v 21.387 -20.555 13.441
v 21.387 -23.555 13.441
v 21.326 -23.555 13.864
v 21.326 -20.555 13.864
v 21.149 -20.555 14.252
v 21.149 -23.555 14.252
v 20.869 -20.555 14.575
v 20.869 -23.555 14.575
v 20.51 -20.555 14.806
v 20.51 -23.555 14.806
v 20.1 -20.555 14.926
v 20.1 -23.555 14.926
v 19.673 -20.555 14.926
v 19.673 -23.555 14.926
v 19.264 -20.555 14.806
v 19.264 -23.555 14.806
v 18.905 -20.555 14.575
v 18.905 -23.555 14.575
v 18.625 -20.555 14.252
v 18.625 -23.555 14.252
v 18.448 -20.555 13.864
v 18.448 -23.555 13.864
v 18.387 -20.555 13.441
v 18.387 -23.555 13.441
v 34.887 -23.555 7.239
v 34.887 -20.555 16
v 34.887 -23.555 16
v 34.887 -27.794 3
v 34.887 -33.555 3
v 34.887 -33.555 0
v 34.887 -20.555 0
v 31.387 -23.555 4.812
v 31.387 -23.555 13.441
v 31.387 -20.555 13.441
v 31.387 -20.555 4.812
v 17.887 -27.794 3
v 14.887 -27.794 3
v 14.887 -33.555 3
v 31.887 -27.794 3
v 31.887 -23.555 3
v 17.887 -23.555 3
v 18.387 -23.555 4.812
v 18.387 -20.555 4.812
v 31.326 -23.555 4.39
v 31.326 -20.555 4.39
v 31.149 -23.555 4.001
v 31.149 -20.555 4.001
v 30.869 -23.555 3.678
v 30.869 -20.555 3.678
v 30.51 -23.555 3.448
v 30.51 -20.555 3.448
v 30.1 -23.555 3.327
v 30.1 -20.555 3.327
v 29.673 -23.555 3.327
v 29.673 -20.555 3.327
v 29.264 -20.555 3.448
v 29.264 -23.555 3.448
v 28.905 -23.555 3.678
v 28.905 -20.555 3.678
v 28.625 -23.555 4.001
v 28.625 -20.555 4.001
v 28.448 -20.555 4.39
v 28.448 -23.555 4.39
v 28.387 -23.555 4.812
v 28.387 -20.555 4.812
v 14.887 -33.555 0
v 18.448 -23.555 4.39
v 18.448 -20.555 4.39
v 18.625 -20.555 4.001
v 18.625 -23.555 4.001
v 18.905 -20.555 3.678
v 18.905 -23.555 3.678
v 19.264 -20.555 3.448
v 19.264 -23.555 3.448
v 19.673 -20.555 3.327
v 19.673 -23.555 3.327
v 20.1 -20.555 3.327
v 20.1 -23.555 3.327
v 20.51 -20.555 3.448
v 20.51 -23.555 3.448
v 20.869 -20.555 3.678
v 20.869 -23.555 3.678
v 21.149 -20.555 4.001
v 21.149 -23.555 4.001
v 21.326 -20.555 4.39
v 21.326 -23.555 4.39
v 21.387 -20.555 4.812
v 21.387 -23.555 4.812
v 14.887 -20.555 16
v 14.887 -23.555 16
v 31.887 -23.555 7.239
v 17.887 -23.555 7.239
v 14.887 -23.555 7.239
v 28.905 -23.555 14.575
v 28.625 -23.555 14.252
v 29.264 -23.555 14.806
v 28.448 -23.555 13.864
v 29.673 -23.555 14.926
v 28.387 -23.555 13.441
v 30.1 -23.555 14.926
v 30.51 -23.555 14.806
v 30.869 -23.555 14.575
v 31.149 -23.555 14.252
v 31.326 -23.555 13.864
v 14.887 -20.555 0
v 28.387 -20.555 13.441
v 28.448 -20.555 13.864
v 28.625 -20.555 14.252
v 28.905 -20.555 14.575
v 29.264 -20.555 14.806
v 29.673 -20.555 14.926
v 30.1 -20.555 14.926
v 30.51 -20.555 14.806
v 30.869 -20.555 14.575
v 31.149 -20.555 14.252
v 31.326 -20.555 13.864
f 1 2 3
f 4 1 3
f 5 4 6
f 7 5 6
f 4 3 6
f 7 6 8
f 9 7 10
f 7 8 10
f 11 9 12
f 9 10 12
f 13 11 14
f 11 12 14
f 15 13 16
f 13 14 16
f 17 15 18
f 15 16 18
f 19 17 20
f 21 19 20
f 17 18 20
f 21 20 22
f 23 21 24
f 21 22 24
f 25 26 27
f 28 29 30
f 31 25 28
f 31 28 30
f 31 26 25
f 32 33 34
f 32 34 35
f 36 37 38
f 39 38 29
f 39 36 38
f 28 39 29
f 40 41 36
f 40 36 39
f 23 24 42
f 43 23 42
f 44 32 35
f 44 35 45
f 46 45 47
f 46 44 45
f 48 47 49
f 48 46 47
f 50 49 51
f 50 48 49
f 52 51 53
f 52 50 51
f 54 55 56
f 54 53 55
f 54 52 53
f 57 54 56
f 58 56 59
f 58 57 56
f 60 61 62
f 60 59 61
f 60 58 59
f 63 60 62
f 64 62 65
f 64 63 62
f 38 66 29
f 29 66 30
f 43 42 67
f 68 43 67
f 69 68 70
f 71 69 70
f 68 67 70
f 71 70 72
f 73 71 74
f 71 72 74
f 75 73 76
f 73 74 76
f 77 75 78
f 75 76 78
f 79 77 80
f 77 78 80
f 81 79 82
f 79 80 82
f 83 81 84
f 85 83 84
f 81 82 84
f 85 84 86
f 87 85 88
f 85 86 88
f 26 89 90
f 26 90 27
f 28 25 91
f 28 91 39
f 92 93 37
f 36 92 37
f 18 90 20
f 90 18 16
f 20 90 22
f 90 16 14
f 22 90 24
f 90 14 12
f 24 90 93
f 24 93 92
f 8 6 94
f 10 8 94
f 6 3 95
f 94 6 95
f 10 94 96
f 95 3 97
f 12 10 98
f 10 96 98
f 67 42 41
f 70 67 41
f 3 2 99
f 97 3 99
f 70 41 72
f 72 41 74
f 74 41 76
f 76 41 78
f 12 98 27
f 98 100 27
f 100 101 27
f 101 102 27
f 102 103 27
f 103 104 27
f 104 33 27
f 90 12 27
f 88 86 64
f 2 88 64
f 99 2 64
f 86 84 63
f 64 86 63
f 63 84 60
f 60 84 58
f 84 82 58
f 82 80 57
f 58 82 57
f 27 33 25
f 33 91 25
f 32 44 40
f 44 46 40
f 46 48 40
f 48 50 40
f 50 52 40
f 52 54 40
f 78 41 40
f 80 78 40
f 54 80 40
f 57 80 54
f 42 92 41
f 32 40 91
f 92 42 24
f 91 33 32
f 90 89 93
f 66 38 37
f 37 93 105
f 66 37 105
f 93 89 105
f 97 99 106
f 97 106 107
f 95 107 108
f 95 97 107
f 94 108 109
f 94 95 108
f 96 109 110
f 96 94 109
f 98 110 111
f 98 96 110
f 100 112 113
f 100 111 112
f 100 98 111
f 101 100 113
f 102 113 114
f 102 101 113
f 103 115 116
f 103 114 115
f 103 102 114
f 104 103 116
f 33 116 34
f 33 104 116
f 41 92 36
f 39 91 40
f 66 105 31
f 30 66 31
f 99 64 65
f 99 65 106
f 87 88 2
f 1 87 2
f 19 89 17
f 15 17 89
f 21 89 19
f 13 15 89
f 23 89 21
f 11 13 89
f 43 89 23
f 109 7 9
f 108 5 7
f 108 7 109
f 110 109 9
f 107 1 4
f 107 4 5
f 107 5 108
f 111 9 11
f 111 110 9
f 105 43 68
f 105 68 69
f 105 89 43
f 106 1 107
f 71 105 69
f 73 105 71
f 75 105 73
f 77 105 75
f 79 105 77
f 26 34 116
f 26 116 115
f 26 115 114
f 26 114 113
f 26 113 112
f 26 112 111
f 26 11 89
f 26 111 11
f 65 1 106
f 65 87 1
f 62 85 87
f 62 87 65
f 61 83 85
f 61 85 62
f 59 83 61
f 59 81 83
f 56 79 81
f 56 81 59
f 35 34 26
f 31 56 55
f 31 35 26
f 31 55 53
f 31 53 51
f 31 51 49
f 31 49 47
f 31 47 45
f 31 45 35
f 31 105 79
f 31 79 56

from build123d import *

# Parameters (mm, degrees)
SKETCH1_W           = 20
SKETCH1_H           = 13
BOSS_EXTRUDE1_DEPTH = 3
SKETCH2_W           = 20
SKETCH2_H           = 3
BOSS_EXTRUDE2_DEPTH = 13
BOSS_EXTRUDE3_DEPTH = 3
CUT_EXTRUDE1_DEPTH  = 40.66221139


with BuildPart() as part:
    # Sketch1 → Boss-Extrude1 (new body)
    with BuildSketch(Plane.XY):
        with Locations((24.886831503, -27.055)):
            Rectangle(SKETCH1_W, SKETCH1_H)
    extrude(amount=BOSS_EXTRUDE1_DEPTH)

    # Sketch2 → Boss-Extrude2 (add)
    with BuildSketch(Plane.XY.offset(3)):
        with Locations((24.886831503, -22.055)):
            Rectangle(SKETCH2_W, SKETCH2_H)
    extrude(amount=BOSS_EXTRUDE2_DEPTH)

    # Sketch3 → Boss-Extrude3 (add)
    with BuildSketch(Plane(origin=(34.886831503, 0, 0), x_dir=(0, 0, -1), z_dir=(1, 0, 0))):
        Polygon((-7.239132511, -23.555), (-3, -27.79413251), (-3, -23.554999999), align=None)
    boss_extrude3 = extrude(amount=-BOSS_EXTRUDE3_DEPTH)

    # Sketch4 → Cut-Extrude1 (cut, through all)
    with BuildSketch(Plane.XZ.offset(23.555)):
        with BuildLine():
            Line((28.386831503, 4.812110779), (28.386831503, 13.441160462))
            ThreePointArc((28.386831503, 13.441160462), (29.886831503, 14.941160462), (31.386831503, 13.441160462))
            Line((31.386831503, 13.441160462), (31.386831503, 4.812110779))
            ThreePointArc((31.386831503, 4.812110779), (29.886831503, 3.312110779), (28.386831503, 4.812110779))
        make_face()
    cut_extrude1 = extrude(amount=-CUT_EXTRUDE1_DEPTH, mode=Mode.SUBTRACT)

    # Mirror1: Boss-Extrude3, Cut-Extrude1 across plane
    add(boss_extrude3.mirror(Plane.ZY.offset(-24.886831503)))
    add(cut_extrude1.mirror(Plane.ZY.offset(-24.886831503)), mode=Mode.SUBTRACT)


solid = part.part
